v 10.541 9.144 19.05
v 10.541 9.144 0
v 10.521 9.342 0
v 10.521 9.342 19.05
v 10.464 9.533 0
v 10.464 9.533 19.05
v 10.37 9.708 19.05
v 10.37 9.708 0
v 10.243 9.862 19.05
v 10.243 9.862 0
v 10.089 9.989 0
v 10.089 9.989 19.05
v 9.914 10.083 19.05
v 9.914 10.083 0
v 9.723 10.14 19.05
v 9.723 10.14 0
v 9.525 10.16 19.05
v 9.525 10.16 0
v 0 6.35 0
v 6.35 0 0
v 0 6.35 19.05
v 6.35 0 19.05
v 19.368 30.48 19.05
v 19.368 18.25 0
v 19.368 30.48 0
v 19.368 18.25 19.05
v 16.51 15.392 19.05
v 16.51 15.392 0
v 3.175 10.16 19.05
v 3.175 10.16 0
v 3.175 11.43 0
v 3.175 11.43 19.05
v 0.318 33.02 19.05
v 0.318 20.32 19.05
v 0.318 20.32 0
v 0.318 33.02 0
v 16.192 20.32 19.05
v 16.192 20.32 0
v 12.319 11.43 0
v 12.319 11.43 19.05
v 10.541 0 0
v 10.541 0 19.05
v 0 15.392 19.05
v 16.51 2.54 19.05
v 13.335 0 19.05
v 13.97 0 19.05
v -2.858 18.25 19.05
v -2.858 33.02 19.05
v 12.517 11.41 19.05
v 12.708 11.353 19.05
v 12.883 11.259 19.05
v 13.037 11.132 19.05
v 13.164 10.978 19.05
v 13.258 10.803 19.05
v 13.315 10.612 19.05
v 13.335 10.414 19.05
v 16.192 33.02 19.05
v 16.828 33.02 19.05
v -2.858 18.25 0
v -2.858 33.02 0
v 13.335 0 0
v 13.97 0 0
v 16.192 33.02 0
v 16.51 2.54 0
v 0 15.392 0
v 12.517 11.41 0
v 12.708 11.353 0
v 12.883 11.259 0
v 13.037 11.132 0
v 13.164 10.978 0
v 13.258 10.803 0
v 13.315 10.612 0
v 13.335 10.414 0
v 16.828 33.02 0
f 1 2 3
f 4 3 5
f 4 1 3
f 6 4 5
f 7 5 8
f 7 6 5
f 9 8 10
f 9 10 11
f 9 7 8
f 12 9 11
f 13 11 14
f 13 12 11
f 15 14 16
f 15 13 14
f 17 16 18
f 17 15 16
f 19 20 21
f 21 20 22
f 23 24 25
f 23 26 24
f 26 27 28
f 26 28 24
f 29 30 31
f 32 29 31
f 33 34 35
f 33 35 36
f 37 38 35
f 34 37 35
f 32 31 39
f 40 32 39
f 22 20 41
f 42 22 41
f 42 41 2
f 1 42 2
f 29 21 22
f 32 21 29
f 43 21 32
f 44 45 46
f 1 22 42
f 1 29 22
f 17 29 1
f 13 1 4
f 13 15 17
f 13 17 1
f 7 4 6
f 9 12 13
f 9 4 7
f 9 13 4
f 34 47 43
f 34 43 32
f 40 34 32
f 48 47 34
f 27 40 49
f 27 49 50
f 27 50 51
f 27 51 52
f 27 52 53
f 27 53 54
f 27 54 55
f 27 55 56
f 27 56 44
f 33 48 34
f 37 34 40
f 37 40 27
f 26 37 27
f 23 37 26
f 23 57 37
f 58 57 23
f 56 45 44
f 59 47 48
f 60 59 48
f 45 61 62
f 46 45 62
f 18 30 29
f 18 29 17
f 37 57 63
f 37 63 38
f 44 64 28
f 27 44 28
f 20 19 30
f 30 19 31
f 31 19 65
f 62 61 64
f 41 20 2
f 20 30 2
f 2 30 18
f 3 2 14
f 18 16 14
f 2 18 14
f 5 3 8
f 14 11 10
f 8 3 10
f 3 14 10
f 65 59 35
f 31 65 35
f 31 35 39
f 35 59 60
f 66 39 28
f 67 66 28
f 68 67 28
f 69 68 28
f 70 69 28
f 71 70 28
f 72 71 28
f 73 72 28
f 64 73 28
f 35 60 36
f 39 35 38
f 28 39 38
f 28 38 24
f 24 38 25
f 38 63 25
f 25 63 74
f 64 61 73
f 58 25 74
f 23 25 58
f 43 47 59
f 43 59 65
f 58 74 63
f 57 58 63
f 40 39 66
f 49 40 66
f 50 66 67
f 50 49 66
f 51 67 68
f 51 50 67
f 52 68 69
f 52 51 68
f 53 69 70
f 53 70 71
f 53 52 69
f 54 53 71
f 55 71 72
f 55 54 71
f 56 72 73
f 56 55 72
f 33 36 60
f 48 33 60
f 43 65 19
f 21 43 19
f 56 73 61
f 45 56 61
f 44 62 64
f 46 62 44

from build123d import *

# Parameters (mm, degrees)
F0_W        = 7.366
F0_H        = 10.16
F1_DEPTH    = 19.05
F2_T4_DEPTH = 19.05
F2_T9_DEPTH = 19.05
F3_SIZE     = 2.54
F4_SIZE     = 6.35
F5_R        = 1.016


# Not quite as in the source:
# - a fillet or chamfer that OpenCascade refuses, or shapes differently, is made with other operations: its cross-section is extruded or revolved along the edge and cut away or added


with BuildPart() as f1:
    # F0 (on Top) → F1 (new body)
    with BuildSketch(Plane.XY):
        Polygon((0, 20.4722661398), (0, 0), (3.175, 0), (3.175, 10.16), (3.175, 11.43), (8.255, 11.43), (13.335, 11.43), (13.335, 0), (16.51, 0), (16.51, 20.4722661398), (19.3675, 20.4722661398), (19.3675, 33.02), (16.1925, 33.02), (16.1925, 20.32), (8.255, 20.32), (0.3175, 20.32), (0.3175, 33.02), (-2.8575, 33.02), (-2.8575, 20.4722661398), align=None)
        with Locations((6.858, 5.08)):
            Rectangle(F0_W, F0_H)
    extrude(amount=F1_DEPTH)

    # F2: chamfer of 5.08 on 2 edges, made by hand


with BuildPart() as f2_tool2:
    # F2_s3 → F2_t4 (new body)
    with BuildSketch(Plane.XY):
        Polygon((-5.08, 20.4722661398), (0, 15.3922661398), (0, 20.4722661398), align=None)
    extrude(amount=F2_T4_DEPTH)

    split(bisect_by=Plane.YZ.offset(-2.8575), keep=Keep.TOP)


with BuildPart() as f1_1:
    add(f1.part)

    # F2_t1: union F2_tool2
    add(f2_tool2.part)


with BuildPart() as f2_tool7:
    # F2_s8 → F2_t9 (new body)
    with BuildSketch(Plane.XY):
        Polygon((16.51, 15.3922661398), (21.59, 20.4722661398), (16.51, 20.4722661398), align=None)
    extrude(amount=F2_T9_DEPTH)

    split(bisect_by=Plane.YZ.offset(19.3675), keep=Keep.BOTTOM)


with BuildPart() as f1_2:
    add(f1_1.part)

    # F2_t6: union F2_tool7
    add(f2_tool7.part)

    # F3
    f3_edges = [f1_2.edges().sort_by_distance(p)[0] for p in [
        (16.51, 0, 9.525),
        (19.3675, 33.02, 9.525),
    ]]
    chamfer(f3_edges, length=F3_SIZE)

    # F4
    f4_edges = [f1_2.edges().sort_by_distance(p)[0] for p in [
        (0, 0, 9.525),
    ]]
    chamfer(f4_edges, length=F4_SIZE)

    # F5
    f5_edges = [f1_2.edges().sort_by_distance(p)[0] for p in [
        (13.335, 11.43, 9.525),
        (10.541, 10.16, 9.525),
    ]]
    fillet(f5_edges, radius=F5_R)


solid = f1_2.part
